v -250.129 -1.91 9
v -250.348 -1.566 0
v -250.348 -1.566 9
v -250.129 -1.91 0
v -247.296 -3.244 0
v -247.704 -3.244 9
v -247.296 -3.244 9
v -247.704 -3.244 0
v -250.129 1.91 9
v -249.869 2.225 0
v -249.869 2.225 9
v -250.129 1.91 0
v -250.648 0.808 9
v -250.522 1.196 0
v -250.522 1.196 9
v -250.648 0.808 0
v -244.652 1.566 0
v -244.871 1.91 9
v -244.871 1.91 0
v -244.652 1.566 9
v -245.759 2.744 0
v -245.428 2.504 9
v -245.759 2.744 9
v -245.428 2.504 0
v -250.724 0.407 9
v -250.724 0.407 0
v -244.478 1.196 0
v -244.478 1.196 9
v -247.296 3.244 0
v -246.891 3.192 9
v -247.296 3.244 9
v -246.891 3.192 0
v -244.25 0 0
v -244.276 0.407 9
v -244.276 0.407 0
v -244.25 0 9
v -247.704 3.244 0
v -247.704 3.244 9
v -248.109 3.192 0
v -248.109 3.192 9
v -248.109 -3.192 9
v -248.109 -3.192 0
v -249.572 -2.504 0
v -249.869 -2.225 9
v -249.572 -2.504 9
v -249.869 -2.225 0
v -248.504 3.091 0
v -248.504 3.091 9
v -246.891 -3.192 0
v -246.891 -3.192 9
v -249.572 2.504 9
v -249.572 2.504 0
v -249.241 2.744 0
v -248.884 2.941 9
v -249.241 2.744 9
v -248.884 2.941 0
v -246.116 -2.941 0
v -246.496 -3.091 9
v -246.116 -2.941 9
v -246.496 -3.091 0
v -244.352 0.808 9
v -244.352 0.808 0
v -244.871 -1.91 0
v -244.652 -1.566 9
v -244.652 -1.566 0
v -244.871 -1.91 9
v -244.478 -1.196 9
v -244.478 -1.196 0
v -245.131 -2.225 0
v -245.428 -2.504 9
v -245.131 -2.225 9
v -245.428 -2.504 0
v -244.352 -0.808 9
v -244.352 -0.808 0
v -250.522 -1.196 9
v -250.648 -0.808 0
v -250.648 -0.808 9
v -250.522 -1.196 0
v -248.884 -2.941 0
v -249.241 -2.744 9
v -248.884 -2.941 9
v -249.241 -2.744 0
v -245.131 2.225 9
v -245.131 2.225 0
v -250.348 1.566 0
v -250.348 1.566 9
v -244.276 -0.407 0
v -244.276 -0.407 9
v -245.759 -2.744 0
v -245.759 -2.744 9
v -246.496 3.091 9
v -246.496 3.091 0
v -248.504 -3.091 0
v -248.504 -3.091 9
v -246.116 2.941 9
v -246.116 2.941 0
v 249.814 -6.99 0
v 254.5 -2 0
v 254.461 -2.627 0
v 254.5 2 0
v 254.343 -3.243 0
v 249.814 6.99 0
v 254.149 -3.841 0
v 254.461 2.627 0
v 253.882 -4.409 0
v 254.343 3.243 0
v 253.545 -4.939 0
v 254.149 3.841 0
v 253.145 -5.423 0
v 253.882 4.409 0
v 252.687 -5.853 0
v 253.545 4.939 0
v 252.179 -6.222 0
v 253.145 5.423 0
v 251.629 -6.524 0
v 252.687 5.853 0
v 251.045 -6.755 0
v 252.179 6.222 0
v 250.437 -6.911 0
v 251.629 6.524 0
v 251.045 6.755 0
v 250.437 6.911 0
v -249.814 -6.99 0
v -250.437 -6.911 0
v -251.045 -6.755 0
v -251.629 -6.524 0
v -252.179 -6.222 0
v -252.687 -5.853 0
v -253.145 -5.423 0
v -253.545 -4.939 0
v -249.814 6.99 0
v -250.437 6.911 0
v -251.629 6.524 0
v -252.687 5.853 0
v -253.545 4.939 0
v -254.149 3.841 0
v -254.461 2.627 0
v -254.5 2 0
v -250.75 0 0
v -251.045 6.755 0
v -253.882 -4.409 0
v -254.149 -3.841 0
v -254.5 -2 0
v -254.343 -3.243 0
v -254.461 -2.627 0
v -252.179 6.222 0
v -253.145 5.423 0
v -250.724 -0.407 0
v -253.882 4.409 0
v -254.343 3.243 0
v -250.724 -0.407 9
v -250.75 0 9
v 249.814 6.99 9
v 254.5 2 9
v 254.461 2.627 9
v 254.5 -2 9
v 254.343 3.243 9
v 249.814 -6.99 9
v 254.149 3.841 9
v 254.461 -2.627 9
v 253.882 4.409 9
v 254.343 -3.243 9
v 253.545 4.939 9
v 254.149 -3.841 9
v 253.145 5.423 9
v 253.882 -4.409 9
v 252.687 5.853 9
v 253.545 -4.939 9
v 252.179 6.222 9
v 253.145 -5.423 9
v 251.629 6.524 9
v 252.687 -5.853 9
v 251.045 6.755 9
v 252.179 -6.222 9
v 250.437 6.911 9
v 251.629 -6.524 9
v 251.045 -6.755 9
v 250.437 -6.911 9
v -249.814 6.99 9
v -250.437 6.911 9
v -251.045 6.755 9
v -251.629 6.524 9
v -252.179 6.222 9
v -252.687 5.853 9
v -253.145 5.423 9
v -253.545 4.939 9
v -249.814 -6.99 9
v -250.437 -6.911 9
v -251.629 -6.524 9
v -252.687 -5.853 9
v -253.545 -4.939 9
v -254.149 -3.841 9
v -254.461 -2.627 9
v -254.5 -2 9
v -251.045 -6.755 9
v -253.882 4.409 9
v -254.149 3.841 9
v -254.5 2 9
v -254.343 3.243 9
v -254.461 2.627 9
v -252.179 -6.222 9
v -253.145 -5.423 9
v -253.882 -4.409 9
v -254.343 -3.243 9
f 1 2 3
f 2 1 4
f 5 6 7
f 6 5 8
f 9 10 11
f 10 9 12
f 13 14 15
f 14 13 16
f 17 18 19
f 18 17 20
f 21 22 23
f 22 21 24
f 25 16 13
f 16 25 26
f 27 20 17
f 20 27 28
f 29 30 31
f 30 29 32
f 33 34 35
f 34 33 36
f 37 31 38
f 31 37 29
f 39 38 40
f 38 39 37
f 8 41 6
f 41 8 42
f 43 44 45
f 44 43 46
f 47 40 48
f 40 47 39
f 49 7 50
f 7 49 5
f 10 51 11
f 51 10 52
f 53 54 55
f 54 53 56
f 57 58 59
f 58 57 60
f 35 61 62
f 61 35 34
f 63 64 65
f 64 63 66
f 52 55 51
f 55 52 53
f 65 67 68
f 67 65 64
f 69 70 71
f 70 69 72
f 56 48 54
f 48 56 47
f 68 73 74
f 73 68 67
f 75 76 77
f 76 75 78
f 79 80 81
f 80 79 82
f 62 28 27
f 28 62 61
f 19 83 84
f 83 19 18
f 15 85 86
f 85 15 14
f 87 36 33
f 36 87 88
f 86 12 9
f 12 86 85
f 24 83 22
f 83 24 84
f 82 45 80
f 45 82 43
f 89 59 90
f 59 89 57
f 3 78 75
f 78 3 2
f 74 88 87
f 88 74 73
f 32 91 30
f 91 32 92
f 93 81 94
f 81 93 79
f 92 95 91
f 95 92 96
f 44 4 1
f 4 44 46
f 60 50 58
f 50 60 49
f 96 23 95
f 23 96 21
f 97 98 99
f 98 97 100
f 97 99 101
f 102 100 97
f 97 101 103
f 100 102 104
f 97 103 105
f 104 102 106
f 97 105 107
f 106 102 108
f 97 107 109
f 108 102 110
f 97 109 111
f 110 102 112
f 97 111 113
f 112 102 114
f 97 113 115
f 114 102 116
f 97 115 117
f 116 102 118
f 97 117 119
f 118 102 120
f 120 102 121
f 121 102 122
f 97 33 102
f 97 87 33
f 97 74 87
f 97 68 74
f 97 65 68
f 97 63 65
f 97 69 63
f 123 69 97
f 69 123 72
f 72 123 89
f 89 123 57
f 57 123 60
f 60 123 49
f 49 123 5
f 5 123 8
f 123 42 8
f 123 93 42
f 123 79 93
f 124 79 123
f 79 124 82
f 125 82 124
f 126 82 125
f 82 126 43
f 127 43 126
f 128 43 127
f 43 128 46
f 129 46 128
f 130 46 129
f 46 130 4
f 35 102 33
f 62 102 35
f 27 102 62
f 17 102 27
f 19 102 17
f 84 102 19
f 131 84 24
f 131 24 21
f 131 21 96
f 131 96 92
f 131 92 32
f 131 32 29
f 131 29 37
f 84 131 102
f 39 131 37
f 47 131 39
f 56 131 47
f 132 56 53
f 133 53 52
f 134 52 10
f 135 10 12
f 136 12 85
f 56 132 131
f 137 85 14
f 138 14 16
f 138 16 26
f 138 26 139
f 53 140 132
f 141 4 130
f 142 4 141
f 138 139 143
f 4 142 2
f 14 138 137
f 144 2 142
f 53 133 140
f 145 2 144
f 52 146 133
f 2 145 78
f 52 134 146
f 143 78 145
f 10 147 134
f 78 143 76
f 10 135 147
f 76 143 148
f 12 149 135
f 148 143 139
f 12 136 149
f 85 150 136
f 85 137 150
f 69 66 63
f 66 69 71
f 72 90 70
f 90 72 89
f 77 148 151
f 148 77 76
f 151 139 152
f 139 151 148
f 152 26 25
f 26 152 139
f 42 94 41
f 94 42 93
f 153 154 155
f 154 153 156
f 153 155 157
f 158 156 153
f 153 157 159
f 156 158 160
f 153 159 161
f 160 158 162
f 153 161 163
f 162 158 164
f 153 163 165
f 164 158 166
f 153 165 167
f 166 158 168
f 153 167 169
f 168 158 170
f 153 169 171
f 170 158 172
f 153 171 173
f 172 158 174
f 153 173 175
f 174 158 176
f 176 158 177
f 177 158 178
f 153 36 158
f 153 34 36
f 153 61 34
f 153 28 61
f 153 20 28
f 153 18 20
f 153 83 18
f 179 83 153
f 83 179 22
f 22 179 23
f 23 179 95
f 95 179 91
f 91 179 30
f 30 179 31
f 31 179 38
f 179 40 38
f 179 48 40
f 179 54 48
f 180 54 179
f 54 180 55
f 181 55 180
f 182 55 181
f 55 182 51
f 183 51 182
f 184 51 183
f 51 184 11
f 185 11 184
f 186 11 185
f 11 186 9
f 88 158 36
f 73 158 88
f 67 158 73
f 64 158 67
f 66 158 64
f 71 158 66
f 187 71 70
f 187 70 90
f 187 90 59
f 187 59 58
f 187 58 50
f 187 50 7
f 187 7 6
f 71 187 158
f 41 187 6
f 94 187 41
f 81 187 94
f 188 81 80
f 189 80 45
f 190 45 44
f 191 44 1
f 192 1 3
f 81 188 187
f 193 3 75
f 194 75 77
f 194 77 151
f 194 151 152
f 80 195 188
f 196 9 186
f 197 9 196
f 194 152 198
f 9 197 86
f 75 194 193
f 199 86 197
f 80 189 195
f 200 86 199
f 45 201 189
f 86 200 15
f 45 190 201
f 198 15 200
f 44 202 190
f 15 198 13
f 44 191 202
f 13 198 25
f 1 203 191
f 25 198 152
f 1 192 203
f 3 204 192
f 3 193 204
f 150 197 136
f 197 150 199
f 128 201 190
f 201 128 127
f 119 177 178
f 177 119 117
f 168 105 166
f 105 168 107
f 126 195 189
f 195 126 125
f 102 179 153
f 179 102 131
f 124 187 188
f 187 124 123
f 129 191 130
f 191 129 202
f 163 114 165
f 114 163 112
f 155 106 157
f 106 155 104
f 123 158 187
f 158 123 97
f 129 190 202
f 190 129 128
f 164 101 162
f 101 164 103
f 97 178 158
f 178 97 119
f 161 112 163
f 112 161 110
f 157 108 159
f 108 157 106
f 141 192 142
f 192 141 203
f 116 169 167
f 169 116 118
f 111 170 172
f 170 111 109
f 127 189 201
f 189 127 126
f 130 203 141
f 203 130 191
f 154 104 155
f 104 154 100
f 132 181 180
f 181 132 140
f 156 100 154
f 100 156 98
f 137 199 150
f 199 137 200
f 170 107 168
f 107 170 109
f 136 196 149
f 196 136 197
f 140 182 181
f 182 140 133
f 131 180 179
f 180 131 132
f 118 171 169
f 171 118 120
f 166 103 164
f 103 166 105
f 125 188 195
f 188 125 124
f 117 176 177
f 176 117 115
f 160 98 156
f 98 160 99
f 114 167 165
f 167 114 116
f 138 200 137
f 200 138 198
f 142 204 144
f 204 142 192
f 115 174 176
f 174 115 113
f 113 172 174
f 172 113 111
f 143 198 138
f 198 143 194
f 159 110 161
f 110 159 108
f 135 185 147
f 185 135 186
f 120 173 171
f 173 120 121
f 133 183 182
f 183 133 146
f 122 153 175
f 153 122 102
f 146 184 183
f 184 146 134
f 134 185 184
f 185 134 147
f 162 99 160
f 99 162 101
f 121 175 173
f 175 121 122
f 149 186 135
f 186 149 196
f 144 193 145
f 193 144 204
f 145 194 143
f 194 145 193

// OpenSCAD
$fn = 50;


difference() {
	union() {
		hull() {
			translate(v = [-249.5000000000, 2.0000000000, 0]) {
				cylinder(h = 9, r = 5);
			}
			translate(v = [249.5000000000, 2.0000000000, 0]) {
				cylinder(h = 9, r = 5);
			}
			translate(v = [-249.5000000000, -2.0000000000, 0]) {
				cylinder(h = 9, r = 5);
			}
			translate(v = [249.5000000000, -2.0000000000, 0]) {
				cylinder(h = 9, r = 5);
			}
		}
	}
	union() {
		translate(v = [-247.5000000000, 0.0000000000, 0]) {
			cylinder(h = 9, r = 3.2500000000);
		}
		translate(v = [-247.5000000000, 0.0000000000, 0]) {
			cylinder(h = 9, r = 1.8000000000);
		}
		translate(v = [-247.5000000000, 0.0000000000, 0]) {
			cylinder(h = 9, r = 1.8000000000);
		}
		translate(v = [-247.5000000000, 0.0000000000, 0]) {
			cylinder(h = 9, r = 1.8000000000);
		}
	}
}
